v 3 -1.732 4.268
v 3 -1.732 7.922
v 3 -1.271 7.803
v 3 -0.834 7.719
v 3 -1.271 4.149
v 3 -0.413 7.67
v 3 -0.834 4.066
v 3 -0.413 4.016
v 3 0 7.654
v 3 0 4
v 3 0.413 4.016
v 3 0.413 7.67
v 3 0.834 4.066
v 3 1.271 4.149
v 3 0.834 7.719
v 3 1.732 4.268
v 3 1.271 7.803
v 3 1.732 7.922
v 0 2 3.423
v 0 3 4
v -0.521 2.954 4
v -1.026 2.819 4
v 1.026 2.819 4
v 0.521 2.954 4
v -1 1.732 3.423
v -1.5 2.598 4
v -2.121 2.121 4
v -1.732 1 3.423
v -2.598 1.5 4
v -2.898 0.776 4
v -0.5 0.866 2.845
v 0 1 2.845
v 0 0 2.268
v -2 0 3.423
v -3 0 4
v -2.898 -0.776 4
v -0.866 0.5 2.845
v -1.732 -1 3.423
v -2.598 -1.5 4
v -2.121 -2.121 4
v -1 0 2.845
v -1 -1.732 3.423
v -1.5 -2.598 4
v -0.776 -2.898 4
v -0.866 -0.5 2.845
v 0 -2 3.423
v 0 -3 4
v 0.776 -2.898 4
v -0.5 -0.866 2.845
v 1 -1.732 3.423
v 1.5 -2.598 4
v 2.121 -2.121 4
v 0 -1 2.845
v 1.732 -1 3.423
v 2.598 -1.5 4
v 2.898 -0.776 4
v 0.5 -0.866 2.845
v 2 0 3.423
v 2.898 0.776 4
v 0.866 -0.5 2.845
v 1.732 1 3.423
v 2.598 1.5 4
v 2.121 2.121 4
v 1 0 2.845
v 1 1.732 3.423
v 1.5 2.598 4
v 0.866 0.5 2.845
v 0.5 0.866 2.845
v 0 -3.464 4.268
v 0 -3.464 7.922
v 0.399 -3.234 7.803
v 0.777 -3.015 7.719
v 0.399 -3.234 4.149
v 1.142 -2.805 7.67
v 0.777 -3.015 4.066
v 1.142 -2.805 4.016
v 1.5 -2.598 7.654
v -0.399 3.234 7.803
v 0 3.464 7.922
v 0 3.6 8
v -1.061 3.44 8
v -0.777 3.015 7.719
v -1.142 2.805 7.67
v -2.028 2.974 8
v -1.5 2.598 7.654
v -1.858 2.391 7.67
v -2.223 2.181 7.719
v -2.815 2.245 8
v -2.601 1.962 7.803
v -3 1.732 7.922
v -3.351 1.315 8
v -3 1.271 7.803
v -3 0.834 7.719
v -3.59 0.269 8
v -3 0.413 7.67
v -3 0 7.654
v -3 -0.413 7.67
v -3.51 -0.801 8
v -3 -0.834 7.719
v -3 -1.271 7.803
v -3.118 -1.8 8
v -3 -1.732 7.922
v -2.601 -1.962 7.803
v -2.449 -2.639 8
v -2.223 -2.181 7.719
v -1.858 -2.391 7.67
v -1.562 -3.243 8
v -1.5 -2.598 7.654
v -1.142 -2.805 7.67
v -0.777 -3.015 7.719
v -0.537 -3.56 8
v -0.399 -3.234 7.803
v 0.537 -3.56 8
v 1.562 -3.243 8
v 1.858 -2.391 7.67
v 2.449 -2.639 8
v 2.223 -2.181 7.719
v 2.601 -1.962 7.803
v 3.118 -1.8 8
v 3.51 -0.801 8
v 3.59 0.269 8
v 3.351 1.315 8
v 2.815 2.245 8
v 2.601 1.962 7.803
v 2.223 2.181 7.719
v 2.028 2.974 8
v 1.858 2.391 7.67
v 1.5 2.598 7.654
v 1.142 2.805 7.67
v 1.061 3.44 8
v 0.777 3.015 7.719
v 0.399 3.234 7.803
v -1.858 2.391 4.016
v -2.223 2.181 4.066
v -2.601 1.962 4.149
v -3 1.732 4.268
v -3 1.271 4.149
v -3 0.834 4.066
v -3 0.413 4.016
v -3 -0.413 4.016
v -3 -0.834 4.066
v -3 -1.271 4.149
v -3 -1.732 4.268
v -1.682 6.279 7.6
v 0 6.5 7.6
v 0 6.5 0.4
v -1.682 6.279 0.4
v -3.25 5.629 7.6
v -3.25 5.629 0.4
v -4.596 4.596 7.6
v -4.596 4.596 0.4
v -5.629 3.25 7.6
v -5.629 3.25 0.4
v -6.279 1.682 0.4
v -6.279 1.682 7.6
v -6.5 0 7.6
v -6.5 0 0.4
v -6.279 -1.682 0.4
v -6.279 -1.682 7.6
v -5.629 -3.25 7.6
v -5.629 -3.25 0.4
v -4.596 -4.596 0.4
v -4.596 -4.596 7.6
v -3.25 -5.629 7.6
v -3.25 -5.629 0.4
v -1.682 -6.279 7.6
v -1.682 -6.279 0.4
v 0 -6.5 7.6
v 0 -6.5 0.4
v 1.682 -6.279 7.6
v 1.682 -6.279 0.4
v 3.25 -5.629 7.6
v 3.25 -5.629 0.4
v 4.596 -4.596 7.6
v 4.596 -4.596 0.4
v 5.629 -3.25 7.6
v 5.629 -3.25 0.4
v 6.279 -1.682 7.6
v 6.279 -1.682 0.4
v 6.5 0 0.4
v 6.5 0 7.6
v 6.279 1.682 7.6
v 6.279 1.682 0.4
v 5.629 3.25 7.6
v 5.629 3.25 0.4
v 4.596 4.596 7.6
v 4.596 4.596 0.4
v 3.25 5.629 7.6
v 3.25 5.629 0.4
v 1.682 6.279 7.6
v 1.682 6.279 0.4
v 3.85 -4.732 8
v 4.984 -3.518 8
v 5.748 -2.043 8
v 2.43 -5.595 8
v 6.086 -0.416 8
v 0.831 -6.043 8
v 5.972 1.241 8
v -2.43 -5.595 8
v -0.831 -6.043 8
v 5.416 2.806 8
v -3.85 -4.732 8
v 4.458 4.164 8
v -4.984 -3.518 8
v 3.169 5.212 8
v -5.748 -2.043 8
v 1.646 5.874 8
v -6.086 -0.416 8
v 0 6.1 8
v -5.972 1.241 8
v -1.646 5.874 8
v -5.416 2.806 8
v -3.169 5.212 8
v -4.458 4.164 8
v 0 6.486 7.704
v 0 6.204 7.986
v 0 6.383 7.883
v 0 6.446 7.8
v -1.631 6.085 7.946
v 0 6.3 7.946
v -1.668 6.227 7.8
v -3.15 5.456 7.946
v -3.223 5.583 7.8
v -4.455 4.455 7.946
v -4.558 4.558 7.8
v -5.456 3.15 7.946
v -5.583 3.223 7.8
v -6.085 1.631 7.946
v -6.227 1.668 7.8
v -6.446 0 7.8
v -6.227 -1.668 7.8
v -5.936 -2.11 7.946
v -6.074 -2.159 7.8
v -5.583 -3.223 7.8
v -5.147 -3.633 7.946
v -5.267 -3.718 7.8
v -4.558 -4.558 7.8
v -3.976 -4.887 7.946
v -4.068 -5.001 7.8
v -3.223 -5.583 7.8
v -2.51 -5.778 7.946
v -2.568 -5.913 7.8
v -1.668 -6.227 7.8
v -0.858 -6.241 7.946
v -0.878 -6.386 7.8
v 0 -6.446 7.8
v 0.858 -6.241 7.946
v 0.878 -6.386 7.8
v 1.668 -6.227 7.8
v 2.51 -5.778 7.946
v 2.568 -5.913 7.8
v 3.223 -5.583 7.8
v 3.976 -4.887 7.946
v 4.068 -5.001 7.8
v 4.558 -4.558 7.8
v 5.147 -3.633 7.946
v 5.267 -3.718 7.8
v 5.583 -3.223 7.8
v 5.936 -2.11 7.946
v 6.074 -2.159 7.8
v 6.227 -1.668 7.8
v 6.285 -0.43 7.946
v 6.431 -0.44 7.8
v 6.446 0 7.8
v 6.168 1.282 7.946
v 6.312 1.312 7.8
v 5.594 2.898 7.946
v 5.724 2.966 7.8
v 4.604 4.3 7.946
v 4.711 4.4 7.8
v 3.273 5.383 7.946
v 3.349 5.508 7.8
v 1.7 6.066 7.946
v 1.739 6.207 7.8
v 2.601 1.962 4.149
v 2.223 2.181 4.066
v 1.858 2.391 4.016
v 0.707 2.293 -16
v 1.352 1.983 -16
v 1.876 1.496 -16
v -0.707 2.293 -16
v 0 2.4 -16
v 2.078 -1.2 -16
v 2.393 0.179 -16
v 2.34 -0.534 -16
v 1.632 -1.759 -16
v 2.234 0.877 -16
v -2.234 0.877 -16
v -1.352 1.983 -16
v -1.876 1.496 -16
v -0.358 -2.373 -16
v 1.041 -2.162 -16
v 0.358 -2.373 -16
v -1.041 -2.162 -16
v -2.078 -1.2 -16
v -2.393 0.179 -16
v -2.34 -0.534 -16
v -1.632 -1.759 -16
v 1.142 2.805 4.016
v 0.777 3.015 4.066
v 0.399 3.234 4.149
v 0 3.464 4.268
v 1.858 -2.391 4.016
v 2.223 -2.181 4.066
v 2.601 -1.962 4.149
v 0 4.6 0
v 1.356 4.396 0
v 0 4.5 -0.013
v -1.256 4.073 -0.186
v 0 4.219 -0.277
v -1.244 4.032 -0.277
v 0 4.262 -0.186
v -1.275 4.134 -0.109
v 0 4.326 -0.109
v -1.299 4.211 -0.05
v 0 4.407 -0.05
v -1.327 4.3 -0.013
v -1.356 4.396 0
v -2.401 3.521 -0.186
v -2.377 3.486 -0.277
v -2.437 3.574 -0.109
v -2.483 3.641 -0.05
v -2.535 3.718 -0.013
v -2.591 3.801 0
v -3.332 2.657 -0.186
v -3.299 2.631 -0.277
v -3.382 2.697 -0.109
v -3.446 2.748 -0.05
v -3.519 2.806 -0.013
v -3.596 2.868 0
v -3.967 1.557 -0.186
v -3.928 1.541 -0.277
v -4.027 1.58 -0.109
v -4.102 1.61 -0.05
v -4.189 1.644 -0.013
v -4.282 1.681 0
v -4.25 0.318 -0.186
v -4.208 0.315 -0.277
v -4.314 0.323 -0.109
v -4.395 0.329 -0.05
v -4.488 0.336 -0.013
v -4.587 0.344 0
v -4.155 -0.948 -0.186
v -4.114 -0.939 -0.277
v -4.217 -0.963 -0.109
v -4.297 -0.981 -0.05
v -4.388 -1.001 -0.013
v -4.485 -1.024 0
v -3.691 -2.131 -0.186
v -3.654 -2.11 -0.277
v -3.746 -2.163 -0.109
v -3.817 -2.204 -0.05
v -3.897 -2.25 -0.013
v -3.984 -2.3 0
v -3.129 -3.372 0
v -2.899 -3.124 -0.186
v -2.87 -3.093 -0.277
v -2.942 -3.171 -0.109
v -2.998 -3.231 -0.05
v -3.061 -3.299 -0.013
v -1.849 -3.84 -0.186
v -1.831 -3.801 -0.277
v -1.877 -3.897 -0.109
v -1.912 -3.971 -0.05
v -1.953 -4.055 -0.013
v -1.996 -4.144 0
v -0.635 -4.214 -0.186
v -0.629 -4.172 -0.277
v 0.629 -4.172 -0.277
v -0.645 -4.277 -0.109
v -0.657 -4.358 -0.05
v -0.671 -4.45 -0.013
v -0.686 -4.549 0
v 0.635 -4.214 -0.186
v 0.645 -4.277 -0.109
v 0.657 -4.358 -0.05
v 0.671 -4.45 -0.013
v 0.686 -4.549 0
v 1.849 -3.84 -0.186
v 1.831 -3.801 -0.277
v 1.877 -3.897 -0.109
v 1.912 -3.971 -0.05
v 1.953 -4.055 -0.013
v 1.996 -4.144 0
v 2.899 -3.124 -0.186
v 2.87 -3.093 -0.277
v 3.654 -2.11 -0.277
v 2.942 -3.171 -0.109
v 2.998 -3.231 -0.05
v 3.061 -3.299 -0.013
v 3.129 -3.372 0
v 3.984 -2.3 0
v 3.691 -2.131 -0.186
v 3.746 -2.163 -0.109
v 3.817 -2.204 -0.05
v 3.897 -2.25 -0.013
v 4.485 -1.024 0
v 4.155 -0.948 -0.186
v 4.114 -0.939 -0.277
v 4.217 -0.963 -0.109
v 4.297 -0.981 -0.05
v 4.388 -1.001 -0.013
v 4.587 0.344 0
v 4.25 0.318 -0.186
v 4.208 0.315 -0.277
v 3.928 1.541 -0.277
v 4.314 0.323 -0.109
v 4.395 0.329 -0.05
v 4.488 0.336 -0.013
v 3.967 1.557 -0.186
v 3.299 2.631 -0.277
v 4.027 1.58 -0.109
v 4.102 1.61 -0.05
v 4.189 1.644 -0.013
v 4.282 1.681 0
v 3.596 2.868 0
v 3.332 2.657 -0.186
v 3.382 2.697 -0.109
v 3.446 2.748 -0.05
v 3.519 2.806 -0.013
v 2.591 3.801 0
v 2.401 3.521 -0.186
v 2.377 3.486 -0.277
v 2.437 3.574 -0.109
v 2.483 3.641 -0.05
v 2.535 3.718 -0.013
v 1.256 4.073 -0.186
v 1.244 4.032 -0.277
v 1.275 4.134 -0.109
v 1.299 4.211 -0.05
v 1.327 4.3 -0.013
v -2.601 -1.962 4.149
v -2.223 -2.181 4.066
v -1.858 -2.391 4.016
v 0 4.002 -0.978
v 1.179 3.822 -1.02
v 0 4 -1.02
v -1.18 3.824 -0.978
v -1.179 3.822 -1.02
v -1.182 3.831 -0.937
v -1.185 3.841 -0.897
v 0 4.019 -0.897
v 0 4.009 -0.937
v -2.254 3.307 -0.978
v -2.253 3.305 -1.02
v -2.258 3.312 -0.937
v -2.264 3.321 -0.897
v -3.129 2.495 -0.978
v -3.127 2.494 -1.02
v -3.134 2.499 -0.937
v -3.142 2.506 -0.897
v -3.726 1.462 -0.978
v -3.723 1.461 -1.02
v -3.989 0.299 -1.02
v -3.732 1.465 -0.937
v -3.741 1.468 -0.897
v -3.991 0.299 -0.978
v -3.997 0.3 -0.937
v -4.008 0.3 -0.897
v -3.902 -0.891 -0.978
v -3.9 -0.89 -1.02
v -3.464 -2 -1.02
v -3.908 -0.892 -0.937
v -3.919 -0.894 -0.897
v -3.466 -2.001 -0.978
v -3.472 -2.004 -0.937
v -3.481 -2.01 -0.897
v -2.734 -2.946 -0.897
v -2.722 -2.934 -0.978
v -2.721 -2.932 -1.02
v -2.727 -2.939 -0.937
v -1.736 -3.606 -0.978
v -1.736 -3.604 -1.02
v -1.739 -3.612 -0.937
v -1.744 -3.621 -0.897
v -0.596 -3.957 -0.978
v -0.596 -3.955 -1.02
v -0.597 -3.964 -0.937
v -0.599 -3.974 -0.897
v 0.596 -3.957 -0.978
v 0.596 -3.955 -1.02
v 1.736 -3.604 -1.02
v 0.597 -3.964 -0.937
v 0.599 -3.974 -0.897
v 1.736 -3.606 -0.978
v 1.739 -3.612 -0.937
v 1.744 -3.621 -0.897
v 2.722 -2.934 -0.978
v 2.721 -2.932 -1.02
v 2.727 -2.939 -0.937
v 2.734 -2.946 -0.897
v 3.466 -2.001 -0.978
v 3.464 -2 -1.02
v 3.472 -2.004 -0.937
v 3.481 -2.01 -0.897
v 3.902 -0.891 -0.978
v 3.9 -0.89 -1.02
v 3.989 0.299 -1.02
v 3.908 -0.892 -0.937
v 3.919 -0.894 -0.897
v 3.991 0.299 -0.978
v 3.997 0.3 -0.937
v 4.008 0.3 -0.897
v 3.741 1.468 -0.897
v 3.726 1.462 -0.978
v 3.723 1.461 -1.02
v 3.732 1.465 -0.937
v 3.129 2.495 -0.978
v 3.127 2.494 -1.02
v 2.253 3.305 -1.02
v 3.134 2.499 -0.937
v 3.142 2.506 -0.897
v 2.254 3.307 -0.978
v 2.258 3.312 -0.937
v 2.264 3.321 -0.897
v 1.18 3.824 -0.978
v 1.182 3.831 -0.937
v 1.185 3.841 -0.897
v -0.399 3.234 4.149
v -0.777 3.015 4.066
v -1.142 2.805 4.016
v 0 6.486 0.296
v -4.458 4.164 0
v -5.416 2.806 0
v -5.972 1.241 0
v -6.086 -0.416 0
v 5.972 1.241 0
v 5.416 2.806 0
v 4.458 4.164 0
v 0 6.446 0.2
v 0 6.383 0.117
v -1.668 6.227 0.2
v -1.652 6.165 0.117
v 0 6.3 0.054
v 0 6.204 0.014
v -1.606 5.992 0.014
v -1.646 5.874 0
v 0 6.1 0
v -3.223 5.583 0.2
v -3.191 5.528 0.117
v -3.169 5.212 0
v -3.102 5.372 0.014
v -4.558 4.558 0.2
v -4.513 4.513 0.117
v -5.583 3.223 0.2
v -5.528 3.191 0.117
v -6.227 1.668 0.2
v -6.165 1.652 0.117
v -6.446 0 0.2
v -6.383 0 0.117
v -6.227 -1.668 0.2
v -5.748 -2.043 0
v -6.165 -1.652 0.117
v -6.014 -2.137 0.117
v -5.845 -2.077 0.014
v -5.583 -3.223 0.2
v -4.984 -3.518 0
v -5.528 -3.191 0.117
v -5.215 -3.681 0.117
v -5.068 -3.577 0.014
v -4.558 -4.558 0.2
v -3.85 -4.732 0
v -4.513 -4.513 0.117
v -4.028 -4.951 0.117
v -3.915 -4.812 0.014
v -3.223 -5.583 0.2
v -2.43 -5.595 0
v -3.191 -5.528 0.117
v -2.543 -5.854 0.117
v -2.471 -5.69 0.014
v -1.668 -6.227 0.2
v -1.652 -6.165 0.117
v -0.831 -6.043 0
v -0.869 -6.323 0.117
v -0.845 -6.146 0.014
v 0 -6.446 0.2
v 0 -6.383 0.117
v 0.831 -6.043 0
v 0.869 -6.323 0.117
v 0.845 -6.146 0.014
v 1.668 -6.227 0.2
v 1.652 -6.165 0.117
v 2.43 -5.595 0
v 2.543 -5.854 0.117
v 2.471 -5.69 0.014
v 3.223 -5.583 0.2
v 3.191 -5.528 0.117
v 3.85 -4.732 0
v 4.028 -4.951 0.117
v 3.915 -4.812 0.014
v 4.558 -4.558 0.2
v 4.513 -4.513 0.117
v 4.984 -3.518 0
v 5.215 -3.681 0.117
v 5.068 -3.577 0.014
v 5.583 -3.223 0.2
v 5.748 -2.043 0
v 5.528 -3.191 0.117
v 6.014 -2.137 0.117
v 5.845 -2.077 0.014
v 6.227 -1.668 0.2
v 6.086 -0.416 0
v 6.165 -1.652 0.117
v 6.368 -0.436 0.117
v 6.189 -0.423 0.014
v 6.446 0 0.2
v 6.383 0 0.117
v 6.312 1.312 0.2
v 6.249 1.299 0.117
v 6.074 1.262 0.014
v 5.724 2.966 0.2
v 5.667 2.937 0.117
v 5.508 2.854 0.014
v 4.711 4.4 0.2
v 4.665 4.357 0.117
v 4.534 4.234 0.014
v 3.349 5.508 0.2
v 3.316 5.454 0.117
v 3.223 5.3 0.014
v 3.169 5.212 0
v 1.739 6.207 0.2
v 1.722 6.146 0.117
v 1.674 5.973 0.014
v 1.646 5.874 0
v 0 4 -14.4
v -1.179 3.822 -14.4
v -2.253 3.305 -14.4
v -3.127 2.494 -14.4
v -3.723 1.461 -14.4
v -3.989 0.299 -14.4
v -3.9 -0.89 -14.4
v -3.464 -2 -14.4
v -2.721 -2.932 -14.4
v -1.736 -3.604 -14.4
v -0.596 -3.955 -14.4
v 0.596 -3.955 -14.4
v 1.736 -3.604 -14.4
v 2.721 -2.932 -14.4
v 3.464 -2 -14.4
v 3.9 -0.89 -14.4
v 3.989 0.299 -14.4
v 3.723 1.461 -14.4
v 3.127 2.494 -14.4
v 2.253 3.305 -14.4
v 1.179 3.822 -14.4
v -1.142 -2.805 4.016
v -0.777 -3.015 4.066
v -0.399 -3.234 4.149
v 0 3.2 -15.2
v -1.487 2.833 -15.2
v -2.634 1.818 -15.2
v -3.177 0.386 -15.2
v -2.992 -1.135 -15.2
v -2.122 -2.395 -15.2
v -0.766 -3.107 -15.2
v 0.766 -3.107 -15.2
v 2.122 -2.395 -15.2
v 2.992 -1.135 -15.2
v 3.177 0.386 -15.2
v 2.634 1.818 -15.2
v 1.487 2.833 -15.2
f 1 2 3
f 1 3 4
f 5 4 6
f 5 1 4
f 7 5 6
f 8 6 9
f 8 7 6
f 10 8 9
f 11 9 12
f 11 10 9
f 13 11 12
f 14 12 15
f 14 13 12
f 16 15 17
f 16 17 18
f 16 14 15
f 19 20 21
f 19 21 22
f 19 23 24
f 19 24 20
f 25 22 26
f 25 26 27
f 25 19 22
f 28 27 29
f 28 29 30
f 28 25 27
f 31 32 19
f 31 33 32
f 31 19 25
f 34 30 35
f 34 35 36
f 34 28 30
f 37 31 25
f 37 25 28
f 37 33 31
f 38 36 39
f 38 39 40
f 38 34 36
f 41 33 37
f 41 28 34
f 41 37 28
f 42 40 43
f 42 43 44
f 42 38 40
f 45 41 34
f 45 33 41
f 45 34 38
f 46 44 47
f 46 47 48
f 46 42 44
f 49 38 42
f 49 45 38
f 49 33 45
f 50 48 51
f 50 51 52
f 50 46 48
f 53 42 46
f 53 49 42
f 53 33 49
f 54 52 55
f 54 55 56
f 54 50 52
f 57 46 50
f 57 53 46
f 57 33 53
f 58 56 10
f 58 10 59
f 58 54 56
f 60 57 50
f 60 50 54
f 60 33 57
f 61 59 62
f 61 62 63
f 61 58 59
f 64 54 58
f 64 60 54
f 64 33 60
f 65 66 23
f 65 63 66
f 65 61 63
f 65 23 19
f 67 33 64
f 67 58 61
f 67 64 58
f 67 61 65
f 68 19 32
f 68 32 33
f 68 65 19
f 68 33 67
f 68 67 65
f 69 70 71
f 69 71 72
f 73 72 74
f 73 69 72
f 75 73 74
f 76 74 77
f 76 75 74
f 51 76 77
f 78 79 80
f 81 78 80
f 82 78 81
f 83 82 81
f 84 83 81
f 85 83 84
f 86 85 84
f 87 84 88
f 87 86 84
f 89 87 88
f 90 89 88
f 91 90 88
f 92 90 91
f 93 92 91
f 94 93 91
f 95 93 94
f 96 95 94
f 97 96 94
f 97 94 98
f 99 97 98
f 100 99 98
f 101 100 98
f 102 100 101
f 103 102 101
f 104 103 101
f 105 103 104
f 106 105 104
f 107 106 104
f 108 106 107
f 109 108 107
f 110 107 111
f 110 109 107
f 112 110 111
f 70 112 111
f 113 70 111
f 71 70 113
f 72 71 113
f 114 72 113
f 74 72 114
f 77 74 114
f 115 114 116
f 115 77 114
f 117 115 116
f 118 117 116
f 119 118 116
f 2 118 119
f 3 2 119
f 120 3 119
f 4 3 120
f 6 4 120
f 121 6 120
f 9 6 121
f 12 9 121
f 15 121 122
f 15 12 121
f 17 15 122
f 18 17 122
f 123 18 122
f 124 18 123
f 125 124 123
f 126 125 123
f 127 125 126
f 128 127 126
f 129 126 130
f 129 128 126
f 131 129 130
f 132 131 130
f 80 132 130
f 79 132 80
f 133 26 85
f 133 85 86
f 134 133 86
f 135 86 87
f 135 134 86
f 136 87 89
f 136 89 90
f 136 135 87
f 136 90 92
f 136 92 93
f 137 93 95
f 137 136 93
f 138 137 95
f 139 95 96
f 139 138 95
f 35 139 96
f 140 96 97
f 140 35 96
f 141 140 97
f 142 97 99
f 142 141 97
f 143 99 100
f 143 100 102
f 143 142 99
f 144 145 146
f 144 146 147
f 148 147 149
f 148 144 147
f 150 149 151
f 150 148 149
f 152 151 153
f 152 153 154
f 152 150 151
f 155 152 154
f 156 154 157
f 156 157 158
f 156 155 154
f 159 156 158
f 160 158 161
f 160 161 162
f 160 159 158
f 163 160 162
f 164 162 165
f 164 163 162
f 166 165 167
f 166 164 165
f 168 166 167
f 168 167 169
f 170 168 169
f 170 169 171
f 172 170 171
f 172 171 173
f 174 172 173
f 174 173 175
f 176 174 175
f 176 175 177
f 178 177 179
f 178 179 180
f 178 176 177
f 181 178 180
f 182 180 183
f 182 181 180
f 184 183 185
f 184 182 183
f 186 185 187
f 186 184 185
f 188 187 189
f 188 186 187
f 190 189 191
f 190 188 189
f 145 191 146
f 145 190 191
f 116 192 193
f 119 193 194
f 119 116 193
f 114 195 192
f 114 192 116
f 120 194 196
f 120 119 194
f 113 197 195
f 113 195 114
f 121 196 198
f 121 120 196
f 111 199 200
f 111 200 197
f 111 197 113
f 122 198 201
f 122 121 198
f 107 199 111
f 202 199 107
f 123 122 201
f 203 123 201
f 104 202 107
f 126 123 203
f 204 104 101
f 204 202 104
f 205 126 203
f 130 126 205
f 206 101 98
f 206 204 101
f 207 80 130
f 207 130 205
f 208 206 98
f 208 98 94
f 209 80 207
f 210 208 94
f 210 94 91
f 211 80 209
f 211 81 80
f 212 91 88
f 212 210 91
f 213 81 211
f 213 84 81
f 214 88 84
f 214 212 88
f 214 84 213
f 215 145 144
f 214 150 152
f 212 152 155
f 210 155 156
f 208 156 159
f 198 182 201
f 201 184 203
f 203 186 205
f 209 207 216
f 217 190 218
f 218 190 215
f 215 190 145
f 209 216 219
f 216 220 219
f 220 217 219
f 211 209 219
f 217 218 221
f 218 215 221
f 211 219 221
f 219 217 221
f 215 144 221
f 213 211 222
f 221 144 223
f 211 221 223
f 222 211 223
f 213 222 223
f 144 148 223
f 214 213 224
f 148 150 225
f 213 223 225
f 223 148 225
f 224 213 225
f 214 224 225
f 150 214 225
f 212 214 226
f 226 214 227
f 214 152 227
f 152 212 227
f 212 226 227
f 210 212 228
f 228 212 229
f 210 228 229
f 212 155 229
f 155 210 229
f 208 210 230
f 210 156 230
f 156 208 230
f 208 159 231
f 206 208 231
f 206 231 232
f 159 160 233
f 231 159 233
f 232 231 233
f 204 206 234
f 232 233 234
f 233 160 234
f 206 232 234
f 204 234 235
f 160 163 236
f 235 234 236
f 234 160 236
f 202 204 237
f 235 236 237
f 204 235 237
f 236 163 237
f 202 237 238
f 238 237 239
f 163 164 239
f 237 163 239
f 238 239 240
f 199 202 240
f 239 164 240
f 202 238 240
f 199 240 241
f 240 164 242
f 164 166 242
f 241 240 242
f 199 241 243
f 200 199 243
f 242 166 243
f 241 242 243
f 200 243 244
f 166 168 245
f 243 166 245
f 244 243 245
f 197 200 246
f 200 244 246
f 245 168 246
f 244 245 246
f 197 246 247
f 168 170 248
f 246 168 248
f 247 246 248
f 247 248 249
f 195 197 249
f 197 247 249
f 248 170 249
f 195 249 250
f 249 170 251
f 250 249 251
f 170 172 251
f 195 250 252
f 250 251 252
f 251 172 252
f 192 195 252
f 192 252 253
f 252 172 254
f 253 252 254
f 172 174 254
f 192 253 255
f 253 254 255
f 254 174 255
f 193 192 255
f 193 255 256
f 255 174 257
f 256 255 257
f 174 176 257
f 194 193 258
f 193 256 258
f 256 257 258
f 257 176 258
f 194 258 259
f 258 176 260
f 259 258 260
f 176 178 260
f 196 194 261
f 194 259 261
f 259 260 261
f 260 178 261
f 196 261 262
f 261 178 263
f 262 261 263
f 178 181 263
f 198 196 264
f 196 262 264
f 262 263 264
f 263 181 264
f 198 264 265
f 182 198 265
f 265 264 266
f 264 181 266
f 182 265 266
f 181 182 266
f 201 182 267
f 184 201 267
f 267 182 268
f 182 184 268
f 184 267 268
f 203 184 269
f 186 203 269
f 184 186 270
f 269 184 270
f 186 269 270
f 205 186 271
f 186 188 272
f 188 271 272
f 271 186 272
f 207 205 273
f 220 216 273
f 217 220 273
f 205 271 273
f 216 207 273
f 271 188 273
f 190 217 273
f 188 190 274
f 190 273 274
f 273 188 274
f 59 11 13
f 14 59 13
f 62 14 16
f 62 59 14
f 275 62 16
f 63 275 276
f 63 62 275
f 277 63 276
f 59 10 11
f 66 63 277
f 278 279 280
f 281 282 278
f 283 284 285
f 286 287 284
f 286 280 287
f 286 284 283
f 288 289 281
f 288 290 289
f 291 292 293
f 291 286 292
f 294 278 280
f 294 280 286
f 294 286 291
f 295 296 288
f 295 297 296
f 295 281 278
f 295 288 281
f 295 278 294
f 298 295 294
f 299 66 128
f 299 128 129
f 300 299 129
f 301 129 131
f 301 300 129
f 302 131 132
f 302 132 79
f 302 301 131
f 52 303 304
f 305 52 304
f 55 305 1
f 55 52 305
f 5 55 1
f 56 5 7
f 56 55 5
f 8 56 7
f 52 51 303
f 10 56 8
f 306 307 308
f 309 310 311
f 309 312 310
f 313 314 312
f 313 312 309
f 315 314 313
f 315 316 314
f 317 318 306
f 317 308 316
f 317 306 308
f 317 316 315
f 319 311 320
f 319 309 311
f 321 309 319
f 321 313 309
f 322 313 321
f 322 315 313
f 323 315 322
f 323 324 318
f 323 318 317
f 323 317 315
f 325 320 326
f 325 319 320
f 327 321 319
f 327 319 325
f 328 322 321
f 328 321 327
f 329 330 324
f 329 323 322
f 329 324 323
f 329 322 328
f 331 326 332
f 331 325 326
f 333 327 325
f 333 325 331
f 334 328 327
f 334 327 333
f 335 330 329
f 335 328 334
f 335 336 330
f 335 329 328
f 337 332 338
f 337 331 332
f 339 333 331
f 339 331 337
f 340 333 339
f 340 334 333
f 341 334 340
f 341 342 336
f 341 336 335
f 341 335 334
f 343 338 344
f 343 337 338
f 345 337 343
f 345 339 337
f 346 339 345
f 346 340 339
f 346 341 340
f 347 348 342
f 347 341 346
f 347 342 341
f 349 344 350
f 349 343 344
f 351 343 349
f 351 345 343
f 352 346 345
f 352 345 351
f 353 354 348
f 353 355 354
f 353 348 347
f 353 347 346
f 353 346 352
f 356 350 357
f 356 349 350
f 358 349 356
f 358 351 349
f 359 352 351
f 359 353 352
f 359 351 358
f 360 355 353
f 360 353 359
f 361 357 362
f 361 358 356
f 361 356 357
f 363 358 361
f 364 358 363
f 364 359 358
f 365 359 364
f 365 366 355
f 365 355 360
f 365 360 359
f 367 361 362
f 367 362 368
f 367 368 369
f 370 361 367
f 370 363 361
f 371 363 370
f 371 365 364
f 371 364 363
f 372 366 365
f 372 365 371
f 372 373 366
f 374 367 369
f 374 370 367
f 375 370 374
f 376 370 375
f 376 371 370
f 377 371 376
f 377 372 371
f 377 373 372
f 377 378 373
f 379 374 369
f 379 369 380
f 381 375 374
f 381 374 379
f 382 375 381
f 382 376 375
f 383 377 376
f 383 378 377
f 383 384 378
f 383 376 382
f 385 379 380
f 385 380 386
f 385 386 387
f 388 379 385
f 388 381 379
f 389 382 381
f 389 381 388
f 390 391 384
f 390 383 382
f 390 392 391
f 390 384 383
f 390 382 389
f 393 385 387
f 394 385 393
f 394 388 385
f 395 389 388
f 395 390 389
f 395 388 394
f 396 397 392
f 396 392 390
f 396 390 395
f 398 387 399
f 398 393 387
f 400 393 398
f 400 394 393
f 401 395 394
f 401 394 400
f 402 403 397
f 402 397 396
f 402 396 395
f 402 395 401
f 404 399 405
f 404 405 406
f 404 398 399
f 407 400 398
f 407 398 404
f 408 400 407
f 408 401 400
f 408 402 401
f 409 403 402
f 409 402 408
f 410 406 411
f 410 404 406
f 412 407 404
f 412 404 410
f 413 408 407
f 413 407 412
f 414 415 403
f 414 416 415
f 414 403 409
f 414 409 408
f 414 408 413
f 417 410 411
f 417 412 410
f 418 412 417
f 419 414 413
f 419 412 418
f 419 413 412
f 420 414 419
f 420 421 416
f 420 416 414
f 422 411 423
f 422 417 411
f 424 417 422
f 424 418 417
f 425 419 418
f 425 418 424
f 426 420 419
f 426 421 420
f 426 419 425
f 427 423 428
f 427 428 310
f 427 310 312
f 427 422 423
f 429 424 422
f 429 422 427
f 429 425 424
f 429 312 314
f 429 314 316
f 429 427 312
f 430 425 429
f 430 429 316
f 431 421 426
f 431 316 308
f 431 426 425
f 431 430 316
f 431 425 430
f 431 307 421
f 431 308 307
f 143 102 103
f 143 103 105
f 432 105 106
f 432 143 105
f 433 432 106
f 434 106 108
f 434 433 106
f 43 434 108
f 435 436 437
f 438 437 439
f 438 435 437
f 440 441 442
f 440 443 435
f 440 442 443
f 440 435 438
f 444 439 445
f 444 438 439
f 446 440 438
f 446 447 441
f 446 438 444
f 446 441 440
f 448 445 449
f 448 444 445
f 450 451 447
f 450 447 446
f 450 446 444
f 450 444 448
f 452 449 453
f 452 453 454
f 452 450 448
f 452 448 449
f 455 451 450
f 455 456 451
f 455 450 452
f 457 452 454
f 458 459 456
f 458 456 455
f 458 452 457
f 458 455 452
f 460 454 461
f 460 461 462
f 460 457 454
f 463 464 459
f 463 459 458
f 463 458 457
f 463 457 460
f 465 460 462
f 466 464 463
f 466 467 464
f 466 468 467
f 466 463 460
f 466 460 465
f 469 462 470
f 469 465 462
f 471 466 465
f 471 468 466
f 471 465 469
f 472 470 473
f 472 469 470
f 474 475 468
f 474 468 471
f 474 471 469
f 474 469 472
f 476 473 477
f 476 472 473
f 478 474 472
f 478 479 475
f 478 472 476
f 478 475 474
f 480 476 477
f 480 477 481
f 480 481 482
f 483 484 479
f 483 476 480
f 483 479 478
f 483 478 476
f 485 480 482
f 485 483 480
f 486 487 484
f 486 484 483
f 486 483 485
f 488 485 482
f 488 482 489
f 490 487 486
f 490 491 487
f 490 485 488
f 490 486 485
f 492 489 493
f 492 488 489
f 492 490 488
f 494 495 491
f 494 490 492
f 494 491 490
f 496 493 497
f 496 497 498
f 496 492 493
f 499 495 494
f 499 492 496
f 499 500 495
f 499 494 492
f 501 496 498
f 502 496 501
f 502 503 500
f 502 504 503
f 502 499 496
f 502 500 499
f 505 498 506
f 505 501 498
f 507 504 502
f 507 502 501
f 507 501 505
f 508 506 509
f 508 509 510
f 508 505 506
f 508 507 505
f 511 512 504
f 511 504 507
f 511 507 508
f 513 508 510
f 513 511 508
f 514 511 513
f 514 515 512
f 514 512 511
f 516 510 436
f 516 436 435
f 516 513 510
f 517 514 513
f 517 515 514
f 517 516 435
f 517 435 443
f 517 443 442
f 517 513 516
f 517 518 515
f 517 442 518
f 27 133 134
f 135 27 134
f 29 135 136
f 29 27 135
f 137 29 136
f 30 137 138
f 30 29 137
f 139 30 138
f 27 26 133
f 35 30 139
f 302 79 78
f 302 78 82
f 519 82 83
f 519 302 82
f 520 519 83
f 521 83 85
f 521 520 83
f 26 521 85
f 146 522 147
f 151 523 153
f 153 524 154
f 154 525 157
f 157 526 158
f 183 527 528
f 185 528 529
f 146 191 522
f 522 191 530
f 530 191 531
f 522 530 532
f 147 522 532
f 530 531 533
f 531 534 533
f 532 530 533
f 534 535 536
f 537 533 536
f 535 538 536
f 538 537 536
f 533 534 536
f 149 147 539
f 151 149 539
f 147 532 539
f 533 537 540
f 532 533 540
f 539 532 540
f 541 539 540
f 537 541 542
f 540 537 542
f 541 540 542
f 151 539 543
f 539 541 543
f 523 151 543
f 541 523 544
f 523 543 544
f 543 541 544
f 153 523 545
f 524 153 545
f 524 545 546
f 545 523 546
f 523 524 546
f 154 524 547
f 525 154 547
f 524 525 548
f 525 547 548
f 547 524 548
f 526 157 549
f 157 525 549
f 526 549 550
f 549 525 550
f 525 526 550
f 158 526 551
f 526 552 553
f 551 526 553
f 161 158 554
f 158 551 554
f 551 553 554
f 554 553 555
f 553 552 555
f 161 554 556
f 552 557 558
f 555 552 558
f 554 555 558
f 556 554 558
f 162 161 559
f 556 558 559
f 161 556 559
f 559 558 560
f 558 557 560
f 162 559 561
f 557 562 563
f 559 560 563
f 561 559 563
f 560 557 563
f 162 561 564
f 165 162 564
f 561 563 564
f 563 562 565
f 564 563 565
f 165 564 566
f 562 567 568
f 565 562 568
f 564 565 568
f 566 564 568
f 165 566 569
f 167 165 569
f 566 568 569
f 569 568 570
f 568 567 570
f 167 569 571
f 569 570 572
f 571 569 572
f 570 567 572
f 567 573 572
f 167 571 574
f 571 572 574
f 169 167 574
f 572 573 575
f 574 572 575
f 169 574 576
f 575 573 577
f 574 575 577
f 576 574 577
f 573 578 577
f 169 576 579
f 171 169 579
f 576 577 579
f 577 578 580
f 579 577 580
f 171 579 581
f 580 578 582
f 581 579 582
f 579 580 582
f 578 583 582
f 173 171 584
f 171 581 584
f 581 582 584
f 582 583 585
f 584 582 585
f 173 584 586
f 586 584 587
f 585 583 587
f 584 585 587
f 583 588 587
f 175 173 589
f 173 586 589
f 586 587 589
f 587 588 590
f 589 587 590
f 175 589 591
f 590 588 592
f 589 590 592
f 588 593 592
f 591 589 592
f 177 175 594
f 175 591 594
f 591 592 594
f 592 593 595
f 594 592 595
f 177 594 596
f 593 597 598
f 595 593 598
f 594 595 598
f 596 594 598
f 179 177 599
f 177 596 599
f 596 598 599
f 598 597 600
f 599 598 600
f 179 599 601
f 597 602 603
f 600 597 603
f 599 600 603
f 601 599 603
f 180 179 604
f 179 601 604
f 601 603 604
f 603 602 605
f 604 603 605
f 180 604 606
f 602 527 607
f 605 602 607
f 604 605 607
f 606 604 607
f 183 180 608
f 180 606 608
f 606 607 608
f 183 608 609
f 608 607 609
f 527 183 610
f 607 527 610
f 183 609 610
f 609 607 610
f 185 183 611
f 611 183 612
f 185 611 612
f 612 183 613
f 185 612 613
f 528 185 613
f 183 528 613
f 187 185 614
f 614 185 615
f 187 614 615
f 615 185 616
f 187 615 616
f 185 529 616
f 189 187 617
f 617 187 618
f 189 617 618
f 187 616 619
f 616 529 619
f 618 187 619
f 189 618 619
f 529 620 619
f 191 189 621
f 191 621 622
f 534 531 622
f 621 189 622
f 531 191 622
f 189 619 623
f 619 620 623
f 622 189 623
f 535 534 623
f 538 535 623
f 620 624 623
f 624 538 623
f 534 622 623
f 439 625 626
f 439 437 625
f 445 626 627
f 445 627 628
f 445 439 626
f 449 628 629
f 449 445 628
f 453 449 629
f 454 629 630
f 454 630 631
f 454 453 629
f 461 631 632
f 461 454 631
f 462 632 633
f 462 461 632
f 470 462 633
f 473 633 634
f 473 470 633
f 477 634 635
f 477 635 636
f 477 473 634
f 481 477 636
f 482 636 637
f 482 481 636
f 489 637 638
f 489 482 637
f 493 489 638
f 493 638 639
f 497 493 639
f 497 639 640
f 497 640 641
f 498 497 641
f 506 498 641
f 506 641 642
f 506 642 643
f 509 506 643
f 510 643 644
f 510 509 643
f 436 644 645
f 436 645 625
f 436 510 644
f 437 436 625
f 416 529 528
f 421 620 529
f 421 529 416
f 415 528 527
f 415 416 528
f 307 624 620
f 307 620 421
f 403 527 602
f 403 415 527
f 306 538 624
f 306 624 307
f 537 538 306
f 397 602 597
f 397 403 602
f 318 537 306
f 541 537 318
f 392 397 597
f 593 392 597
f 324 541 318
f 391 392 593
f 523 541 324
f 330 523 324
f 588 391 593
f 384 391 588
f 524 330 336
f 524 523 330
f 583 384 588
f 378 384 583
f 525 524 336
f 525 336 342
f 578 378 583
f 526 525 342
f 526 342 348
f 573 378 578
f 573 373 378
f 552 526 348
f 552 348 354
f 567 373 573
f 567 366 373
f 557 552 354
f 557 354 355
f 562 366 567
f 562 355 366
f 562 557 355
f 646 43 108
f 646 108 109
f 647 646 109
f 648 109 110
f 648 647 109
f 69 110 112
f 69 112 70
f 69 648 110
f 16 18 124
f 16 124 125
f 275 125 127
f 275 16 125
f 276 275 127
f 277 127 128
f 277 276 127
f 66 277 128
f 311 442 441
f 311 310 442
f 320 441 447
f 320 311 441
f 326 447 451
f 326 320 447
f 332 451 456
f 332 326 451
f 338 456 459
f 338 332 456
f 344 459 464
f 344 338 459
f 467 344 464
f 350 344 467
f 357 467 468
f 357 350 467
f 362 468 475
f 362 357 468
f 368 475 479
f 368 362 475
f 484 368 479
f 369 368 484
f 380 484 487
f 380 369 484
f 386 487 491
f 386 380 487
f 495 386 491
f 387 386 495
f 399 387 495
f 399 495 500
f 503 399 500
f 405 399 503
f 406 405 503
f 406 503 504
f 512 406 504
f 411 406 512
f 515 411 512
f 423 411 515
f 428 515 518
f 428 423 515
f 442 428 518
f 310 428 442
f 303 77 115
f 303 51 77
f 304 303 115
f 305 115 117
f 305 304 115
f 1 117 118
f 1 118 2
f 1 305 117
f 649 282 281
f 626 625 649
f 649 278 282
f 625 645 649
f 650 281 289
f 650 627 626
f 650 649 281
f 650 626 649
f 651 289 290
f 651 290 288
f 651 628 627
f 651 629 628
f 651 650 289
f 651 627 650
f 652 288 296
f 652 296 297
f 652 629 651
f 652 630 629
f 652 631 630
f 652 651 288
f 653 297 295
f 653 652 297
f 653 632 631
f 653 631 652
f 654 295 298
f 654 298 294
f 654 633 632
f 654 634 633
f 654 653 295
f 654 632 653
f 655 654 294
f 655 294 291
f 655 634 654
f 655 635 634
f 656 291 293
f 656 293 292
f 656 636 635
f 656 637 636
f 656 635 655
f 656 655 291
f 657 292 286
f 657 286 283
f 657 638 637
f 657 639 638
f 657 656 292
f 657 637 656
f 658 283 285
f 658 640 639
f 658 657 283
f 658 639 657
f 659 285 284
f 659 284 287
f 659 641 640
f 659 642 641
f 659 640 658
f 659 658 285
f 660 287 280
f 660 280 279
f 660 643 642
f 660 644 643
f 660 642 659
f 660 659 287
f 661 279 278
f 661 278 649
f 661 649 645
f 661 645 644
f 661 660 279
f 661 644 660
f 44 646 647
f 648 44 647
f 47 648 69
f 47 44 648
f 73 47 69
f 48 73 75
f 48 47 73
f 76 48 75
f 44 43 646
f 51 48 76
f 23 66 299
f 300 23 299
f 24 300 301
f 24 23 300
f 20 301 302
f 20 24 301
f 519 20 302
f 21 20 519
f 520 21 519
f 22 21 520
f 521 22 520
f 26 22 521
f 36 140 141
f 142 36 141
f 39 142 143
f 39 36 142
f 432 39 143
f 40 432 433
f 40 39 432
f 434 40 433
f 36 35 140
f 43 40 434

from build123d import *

# Parameters (mm, degrees)
CUT_EXTRUDE_START   = -4.0000001
CUT_EXTRUDE_1_DEPTH = 3.921539232
FILLET_1_R          = 0.4


with BuildPart() as part:
    # Эскиз1 → Повернуть1 (revolve)
    with BuildSketch(Plane(origin=(0, 0, 0), x_dir=(0, 0, -1), z_dir=(1, 0, 0))):
        with BuildLine():
            Line((16, 0), (16, 2.4))
            Line((16, 2.4), (14.4, 4))
            Line((14.4, 4), (1.02, 4))
            ThreePointArc((1.02, 4), (0.957844465, 4.004858646), (0.897198888, 4.019316553))
            Line((0.897198888, 4.019316553), (0.277198888, 4.219316553))
            ThreePointArc((0.277198888, 4.219316553), (0.076642269, 4.36454347), (0, 4.6))
            Line((0, 4.6), (0, 6.5))
            Line((0, 6.5), (-8, 6.5))
            Line((-8, 6.5), (-8, 3.6))
            Line((-8, 3.6), (-7.653589838, 3))
            Line((-7.653589838, 3), (-4, 3))
            Line((-4, 3), (-2.267949192, 0))
            Line((-2.267949192, 0), (16, 0))
        make_face()
    revolve(axis=Axis((0, 0, -16), (0, 0, 1)))

    # Вырез-Вытянуть1: read off the stored shape, not the designer's step
    # Вырез-Вытянуть1 outline → Вырез-Вытянуть1 (cut)
    with BuildSketch(Plane.XY.offset(8).offset(CUT_EXTRUDE_START)):
        with BuildLine():
            Line((3, 0), (3, 1.732050808))
            Line((3, 1.732050808), (1.499999997, 2.598076213))
            ThreePointArc((1.499999997, 2.598076213), (2.59807621, 1.500000002), (3, 0))
        make_face()
        with BuildLine():
            ThreePointArc((-1.499999956, 2.598076237), (2.4e-08, 3), (1.499999997, 2.598076213))
            Line((1.499999997, 2.598076213), (0, 3.464101615))
            Line((0, 3.464101615), (-1.499999956, 2.598076237))
        make_face()
        with BuildLine():
            Line((3, -1.732050808), (3, 0))
            ThreePointArc((3, 0), (2.59807621, -1.500000002), (1.499999997, -2.598076213))
            Line((1.499999997, -2.598076213), (3, -1.732050808))
        make_face()
        with BuildLine():
            ThreePointArc((-3, 0), (-2.598076199, 1.500000022), (-1.499999956, 2.598076237))
            Line((-1.499999956, 2.598076237), (-3, 1.732050808))
            Line((-3, 1.732050808), (-3, 0))
        make_face()
        with BuildLine():
            Line((0, -3.464101615), (1.499999997, -2.598076213))
            ThreePointArc((1.499999997, -2.598076213), (0, -3), (-1.499999997, -2.598076213))
            Line((-1.499999997, -2.598076213), (0, -3.464101615))
        make_face()
        with BuildLine():
            ThreePointArc((-1.499999997, -2.598076213), (-2.59807621, -1.500000002), (-3, 0))
            Line((-3, 0), (-3, -1.732050808))
            Line((-3, -1.732050808), (-1.499999997, -2.598076213))
        make_face()
    extrude(amount=CUT_EXTRUDE_1_DEPTH, mode=Mode.SUBTRACT)

    # Cut-Extrude 1 2 outline → Cut-Extrude 1 2 (revolve)
    with BuildSketch(Plane.XZ):
        Polygon((3.464101616, 4.267949193), (2.999999957, 3.999999975), (3.464101615, 3.9999999), align=None)
    revolve(axis=Axis((0, 0, 0), (0, 0, 1)))

    # Скругление1
    fillet_1_edges = [part.edges().sort_by_distance(p)[0] for p in [
        (0, -6.5, 0),
        (0, -6.5, 8),
    ]]
    fillet(fillet_1_edges, radius=FILLET_1_R)


solid = part.part
